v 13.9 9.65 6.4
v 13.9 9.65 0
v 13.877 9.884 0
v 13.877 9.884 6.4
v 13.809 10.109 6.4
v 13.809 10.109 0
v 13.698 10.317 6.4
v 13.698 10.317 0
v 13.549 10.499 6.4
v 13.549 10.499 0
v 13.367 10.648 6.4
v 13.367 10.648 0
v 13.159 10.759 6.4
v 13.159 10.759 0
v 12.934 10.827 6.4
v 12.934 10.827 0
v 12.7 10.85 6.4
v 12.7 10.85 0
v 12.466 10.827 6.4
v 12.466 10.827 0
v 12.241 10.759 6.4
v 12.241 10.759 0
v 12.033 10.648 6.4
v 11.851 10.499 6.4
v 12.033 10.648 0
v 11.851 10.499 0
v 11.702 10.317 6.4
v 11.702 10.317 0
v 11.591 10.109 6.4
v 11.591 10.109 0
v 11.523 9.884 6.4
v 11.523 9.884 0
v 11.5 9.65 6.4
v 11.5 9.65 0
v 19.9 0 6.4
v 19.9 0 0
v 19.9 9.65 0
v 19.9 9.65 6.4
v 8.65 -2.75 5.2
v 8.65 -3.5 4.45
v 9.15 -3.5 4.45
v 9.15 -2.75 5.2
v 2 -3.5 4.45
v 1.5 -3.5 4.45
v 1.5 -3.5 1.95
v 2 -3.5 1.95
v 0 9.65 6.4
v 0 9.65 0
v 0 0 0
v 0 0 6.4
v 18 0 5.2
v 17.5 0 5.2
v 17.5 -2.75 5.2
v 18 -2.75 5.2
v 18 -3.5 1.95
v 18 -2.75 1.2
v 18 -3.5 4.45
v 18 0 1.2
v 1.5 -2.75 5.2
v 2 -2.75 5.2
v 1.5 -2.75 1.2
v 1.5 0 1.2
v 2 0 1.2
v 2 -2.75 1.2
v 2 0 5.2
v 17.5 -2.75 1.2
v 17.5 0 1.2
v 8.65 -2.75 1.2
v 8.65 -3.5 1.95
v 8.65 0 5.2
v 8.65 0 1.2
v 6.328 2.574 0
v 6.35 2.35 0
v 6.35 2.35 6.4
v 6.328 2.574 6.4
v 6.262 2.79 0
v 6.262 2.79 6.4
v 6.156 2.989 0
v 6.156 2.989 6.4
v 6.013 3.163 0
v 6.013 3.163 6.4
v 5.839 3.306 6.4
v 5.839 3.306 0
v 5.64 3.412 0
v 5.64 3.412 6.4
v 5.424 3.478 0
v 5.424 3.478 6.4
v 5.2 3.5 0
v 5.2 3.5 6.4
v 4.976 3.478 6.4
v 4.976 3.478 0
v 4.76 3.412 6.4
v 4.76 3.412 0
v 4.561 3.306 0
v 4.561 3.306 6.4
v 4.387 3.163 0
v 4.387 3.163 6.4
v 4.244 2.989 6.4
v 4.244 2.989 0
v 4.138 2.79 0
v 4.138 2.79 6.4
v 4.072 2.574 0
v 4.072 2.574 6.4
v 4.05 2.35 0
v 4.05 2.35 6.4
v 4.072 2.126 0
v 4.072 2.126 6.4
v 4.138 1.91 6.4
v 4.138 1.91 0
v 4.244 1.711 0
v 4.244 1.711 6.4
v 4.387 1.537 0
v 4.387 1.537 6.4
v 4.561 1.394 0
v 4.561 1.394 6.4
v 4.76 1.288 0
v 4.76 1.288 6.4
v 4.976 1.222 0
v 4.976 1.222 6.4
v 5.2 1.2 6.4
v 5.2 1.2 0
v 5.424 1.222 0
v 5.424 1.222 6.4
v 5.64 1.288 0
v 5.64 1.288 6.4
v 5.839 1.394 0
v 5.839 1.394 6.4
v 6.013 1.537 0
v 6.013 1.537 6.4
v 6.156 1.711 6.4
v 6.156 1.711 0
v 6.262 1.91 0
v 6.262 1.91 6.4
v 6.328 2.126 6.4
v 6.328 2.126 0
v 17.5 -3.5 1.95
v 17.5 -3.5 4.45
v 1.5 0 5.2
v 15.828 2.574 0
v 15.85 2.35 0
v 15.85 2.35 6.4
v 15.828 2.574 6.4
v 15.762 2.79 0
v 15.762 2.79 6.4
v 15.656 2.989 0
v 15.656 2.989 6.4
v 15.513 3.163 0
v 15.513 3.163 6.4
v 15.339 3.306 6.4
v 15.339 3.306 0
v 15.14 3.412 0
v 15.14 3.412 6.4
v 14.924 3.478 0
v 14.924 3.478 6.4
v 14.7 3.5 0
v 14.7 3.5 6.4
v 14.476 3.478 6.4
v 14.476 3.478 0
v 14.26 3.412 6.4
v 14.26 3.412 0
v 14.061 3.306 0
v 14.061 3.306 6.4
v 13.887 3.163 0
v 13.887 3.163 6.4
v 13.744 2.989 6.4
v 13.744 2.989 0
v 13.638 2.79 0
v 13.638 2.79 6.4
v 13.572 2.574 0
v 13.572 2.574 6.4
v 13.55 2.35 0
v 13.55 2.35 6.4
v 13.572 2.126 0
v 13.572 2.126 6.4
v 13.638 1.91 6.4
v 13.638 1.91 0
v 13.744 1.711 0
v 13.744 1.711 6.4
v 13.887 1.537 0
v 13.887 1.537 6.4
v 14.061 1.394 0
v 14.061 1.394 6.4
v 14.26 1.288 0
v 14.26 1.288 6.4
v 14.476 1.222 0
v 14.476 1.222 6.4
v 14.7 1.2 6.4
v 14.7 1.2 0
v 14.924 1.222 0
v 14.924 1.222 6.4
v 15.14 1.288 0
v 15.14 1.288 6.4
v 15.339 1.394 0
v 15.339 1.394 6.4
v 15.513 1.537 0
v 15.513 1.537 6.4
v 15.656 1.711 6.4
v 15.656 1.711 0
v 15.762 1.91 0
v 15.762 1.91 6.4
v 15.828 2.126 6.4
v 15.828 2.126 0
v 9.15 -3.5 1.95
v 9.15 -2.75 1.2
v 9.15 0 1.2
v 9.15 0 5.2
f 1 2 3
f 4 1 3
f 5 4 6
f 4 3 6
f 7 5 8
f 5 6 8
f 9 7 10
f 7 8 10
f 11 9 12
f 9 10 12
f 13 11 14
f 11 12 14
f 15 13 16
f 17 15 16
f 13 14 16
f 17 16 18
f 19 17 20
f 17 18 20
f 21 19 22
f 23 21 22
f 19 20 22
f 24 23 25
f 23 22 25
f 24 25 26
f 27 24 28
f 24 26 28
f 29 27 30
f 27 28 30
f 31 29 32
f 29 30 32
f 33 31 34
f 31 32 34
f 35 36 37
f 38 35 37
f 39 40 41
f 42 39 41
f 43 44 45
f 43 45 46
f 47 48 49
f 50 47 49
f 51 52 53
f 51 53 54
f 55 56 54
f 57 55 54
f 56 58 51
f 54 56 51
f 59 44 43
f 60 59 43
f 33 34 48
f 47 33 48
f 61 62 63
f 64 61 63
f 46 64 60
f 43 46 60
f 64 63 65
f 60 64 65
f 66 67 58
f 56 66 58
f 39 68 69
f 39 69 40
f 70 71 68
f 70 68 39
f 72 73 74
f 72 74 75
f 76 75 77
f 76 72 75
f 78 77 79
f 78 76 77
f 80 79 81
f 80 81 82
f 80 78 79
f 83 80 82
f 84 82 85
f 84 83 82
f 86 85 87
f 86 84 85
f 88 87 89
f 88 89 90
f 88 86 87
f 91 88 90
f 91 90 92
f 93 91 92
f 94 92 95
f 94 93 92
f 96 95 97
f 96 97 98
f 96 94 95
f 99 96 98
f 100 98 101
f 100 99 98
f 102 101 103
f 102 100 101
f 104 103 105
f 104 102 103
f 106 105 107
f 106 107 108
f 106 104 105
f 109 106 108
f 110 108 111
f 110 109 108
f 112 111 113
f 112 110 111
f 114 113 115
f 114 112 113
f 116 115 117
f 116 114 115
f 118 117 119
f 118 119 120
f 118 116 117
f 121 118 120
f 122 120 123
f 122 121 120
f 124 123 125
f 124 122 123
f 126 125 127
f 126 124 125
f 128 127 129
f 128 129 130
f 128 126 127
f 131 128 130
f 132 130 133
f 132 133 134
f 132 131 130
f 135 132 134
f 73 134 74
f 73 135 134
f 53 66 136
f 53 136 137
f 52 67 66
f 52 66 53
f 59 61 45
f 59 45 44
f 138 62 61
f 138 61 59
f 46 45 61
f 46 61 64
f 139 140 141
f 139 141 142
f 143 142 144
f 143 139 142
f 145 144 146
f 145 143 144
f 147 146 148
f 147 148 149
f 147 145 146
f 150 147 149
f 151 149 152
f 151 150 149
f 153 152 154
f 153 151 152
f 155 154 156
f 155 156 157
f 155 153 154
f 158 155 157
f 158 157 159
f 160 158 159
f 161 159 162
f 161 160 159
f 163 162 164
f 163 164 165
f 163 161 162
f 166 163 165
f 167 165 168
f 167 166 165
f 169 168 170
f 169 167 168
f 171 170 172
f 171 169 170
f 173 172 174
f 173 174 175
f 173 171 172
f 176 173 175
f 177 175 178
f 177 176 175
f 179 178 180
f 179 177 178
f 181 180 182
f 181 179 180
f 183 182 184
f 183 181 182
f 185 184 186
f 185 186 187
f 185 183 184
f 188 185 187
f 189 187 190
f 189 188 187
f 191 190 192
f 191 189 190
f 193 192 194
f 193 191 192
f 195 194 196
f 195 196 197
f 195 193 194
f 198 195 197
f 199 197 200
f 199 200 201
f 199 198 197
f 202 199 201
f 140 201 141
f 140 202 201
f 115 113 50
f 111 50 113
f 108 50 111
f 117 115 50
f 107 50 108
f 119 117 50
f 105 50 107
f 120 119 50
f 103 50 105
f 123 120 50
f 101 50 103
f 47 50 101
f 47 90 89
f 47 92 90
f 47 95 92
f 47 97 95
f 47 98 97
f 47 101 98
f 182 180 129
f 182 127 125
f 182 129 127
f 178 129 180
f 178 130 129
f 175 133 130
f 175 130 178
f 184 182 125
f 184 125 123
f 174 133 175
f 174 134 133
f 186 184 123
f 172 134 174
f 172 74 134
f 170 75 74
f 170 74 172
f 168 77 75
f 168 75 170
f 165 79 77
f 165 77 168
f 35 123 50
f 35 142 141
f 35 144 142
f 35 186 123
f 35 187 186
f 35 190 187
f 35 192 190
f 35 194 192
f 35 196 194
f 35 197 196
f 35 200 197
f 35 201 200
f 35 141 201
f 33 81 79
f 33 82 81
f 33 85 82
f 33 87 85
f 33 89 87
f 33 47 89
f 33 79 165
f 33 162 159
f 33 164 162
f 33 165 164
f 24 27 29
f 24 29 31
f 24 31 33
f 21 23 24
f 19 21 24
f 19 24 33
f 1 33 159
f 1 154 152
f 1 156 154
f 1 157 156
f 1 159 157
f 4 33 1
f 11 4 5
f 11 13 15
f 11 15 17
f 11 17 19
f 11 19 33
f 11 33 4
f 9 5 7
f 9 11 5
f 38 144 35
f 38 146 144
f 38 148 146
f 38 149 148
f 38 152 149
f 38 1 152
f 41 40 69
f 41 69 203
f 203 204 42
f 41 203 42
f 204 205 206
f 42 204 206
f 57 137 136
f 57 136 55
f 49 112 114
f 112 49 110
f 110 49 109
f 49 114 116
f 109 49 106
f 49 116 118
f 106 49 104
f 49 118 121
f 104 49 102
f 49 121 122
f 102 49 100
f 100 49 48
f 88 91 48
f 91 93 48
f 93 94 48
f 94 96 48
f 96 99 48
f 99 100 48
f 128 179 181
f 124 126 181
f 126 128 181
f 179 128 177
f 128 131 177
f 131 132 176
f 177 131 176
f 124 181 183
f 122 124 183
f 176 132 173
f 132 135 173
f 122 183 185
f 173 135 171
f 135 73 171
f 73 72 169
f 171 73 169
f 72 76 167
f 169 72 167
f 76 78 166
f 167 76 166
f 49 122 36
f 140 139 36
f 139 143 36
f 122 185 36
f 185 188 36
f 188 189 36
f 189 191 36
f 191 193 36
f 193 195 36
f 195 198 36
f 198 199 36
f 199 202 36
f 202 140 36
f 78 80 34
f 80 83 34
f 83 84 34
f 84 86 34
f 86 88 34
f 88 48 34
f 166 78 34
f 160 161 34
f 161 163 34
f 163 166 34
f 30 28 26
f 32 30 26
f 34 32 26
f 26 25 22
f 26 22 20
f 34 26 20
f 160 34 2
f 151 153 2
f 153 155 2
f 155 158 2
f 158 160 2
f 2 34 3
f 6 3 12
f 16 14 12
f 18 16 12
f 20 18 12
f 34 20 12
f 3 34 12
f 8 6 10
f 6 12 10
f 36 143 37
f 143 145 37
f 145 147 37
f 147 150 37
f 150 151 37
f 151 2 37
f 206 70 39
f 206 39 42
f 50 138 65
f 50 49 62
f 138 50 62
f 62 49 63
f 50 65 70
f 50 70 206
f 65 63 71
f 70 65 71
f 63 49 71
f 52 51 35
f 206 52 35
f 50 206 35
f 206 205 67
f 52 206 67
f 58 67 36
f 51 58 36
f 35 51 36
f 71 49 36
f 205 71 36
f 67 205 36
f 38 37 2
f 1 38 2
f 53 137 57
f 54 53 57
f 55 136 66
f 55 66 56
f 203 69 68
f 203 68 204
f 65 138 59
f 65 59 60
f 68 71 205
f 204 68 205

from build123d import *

# Parameters (mm, degrees)
SKETCH_R     = 1.15
PAD_DEPTH    = 6.4
SKETCH001_W  = 0.5
SKETCH001_H  = 4
PAD001_DEPTH = 3.5
CHAMFER_SIZE = 0.75


with BuildPart() as part:
    # Sketch → Pad (new body)
    with BuildSketch(Plane.XY):
        with BuildLine():
            Line((0, 0), (19.9, 0))
            Line((19.9, 0), (19.9, 9.65))
            Line((19.9, 9.65), (13.9, 9.65))
            ThreePointArc((13.9, 9.65), (12.7, 10.85), (11.5, 9.65))
            Line((11.5, 9.65), (0, 9.65))
            Line((0, 9.65), (0, 0))
        make_face()
        with Locations((5.2, 2.35)):
            Circle(SKETCH_R, mode=Mode.SUBTRACT)
        with Locations((14.7, 2.35)):
            Circle(SKETCH_R, mode=Mode.SUBTRACT)
    extrude(amount=PAD_DEPTH)

    # Sketch001 → Pad001 (join)
    with BuildSketch(Plane.XZ):
        with Locations((1.75, 3.2)):
            Rectangle(SKETCH001_W, SKETCH001_H)
        with Locations((8.9, 3.2)):
            Rectangle(SKETCH001_W, SKETCH001_H)
        with Locations((17.75, 3.2)):
            Rectangle(SKETCH001_W, SKETCH001_H)
    extrude(amount=PAD001_DEPTH)

    # Chamfer
    chamfer_edges = [part.edges().sort_by_distance(p)[0] for p in [
        (17.75, -3.5, 5.2),
        (17.75, -3.5, 1.2),
        (1.75, -3.5, 1.2),
        (1.75, -3.5, 5.2),
        (8.9, -3.5, 5.2),
        (8.9, -3.5, 1.2),
    ]]
    chamfer(chamfer_edges, length=CHAMFER_SIZE)


solid = part.part
